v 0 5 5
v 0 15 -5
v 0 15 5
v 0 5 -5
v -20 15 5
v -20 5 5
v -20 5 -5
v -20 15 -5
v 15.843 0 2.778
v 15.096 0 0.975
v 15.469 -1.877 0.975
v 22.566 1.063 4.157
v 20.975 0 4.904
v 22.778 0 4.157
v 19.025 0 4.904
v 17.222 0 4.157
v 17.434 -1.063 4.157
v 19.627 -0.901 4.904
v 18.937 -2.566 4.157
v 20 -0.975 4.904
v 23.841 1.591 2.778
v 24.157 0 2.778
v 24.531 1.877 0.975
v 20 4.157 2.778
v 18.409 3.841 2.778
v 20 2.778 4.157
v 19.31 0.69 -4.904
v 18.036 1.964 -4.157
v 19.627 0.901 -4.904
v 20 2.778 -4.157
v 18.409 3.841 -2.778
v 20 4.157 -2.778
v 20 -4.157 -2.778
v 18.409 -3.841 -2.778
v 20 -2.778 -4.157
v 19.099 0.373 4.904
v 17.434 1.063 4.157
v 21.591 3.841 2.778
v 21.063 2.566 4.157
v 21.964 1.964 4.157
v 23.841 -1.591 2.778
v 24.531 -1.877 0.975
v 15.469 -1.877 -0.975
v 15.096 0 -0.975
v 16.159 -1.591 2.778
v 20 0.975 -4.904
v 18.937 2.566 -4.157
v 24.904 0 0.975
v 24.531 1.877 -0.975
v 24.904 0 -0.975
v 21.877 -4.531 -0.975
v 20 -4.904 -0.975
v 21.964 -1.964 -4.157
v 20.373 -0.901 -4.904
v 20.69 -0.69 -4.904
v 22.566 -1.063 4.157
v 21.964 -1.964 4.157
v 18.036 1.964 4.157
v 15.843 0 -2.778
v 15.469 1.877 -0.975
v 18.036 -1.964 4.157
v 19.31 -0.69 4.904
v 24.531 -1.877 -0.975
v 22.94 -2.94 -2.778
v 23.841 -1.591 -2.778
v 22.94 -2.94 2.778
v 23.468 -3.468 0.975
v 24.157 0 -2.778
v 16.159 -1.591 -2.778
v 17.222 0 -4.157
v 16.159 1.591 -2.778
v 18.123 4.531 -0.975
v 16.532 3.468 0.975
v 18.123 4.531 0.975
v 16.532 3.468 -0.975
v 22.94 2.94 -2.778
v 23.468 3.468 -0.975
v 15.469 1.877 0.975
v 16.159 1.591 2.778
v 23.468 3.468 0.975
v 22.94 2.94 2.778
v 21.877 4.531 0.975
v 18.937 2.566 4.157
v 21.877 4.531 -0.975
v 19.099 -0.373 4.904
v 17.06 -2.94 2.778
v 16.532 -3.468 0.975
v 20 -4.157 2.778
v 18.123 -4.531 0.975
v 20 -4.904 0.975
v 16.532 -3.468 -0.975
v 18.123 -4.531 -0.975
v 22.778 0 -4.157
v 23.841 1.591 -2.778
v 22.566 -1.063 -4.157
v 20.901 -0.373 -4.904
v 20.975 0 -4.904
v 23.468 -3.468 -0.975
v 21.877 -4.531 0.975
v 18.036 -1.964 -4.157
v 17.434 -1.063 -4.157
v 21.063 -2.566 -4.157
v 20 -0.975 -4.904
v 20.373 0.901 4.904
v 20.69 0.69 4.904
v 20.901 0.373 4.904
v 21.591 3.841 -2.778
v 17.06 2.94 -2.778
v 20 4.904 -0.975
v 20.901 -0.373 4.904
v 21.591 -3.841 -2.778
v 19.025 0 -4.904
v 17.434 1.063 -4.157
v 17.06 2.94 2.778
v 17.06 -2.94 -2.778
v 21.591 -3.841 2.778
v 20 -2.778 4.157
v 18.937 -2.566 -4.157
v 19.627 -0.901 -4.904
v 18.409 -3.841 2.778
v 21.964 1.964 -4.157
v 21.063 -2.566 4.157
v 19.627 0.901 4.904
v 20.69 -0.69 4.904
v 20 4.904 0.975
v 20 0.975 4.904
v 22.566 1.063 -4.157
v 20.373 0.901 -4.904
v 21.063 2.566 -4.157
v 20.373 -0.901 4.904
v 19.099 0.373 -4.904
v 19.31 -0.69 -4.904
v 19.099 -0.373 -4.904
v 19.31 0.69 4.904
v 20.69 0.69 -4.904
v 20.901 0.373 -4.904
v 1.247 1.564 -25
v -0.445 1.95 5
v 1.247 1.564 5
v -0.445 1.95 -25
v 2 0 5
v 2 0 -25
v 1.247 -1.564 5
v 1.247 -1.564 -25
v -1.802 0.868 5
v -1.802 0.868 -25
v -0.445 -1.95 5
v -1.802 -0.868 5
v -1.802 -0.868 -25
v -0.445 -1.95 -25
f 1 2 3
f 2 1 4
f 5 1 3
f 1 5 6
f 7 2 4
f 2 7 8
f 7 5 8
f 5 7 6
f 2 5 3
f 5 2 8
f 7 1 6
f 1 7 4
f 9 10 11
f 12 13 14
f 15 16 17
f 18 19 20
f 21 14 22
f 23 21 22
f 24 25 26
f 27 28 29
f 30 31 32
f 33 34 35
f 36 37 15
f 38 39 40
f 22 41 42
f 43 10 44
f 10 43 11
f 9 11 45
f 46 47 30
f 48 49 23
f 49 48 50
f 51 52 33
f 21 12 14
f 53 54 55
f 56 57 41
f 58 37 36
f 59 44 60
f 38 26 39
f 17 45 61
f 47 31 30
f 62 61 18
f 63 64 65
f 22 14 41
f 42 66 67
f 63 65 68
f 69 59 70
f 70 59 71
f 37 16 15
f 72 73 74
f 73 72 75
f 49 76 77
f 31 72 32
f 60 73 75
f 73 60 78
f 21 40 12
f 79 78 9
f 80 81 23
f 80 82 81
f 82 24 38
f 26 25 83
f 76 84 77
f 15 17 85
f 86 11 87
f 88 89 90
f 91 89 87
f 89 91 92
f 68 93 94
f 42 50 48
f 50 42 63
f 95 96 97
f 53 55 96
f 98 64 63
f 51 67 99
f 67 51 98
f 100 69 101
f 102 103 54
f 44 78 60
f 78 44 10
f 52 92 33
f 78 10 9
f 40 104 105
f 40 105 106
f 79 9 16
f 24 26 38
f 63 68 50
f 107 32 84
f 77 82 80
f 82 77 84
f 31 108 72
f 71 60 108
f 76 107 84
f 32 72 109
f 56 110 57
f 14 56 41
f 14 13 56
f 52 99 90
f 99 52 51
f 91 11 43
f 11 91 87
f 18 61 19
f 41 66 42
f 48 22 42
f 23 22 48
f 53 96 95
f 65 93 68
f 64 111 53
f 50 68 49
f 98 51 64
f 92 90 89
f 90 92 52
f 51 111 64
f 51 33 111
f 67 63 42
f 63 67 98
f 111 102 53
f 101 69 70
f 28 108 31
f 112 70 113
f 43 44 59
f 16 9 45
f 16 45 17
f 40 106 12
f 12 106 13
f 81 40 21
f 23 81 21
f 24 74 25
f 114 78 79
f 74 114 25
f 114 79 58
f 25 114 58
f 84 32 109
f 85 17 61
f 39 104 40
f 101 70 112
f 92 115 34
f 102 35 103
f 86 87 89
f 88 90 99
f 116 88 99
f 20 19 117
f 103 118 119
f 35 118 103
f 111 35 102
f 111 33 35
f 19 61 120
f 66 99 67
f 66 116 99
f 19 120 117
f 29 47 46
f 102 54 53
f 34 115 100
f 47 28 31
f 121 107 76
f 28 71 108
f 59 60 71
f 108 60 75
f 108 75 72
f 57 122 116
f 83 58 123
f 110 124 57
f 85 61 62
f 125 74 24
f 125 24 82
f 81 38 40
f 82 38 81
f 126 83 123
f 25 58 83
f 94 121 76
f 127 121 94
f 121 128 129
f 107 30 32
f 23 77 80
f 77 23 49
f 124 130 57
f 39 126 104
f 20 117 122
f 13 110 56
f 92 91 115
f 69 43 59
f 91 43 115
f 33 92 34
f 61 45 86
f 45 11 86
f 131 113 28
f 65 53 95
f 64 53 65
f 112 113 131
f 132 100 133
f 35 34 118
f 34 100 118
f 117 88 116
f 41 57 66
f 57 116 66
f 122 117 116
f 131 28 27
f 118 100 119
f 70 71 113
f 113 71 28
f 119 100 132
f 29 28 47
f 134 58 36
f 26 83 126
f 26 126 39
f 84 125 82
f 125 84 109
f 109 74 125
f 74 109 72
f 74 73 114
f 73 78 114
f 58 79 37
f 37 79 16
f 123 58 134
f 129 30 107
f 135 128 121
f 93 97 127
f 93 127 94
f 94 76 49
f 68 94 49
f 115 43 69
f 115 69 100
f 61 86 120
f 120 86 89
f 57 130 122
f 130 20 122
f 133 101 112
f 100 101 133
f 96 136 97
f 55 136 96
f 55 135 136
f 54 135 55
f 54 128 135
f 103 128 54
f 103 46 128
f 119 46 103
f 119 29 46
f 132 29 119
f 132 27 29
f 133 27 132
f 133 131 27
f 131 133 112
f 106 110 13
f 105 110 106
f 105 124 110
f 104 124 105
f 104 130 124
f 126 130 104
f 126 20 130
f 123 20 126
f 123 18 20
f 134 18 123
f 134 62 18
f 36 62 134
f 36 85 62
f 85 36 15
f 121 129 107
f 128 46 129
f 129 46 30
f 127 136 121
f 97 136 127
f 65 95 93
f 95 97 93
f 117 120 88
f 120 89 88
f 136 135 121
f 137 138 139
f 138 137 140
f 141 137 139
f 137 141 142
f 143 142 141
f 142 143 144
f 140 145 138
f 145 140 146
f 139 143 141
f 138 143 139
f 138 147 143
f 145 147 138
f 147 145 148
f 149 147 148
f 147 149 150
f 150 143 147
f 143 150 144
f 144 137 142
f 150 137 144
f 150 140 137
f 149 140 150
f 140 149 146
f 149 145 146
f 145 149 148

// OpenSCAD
translate([-10, 10, 0]) cube([20, 10, 10], center=true);
translate([20, 0, 0]) sphere(5);
translate([0, 0, -10]) cylinder(h=30, r1=2, r2=2, center=true);
